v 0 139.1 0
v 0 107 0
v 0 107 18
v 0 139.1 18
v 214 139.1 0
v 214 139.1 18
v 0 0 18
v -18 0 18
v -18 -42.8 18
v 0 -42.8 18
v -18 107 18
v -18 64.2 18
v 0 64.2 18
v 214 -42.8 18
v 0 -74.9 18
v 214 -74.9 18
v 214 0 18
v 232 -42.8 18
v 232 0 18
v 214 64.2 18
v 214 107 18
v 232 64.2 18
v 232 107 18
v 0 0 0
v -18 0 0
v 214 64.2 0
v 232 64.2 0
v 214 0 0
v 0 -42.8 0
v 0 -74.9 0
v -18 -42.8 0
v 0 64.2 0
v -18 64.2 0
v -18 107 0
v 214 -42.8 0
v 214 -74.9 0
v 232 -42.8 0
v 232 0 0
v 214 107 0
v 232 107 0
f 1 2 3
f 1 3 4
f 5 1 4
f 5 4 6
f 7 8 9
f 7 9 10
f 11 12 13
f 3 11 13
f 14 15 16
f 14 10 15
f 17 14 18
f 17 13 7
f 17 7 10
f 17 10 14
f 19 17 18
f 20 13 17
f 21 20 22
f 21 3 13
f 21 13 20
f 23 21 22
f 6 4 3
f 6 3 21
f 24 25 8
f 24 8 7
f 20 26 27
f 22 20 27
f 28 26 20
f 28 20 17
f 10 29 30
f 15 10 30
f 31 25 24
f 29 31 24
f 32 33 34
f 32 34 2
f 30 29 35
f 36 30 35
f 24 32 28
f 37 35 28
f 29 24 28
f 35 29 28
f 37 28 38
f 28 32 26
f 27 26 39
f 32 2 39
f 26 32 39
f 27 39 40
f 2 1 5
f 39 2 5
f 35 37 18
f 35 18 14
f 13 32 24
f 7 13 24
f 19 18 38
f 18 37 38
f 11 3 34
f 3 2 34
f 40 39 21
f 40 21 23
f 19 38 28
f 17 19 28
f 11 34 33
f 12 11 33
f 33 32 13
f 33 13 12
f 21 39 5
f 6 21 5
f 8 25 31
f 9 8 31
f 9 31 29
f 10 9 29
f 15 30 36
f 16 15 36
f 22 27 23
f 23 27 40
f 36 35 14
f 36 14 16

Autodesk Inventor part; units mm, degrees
ref_plane "YZ Plane" through (0, 0, 0) normal (1, 0, 0) x (0, 1, 0)
ref_plane "XZ Plane" through (0, 0, 0) normal (0, 1, 0) x (-1, 0, 0)
ref_plane "XY Plane" through (0, 0, 0) normal (0, 0, 1) x (1, 0, 0)
sketch "Sketch1" plane through (0, 0, 0) normal (0, 0, 1) x (1, 0, 0)
  line L0 (232, 157.1) -> (-18, 157.1)
  line L1 (-18, 157.1) -> (-18, -92.9)
  line L2 (-18, -92.9) -> (232, -92.9)
  line L3 (232, -92.9) -> (232, 157.1)
  line L4 (-18, -42.8) -> (0, -42.8)
  line L5 (0, -42.8) -> (0, -92.9)
  line L6 (0, -92.9) -> (-18, -92.9)
  line L7 (-18, -92.9) -> (-18, -42.8)
  line L8 (0, 107) -> (0, 64.2)
  line L9 (0, 64.2) -> (-18, 64.2)
  line L10 (-18, 64.2) -> (-18, 107)
  line L11 (76.5522, 157.3937) -> (94.5522, 157.3937)
  line L12 (-18, -42.8) -> (-18, 0)
  line L13 (-18, 0) -> (0, 0)
  line L14 (0, 0) -> (0, -42.8)
  line L15 (0, -42.8) -> (-18, -42.8)
  line L16 (-18, -42.8) -> (0, -42.8)
  line L17 (0, -42.8) -> (0, 0)
  line L18 (0, 0) -> (-18, 0)
  line L19 (-18, 0) -> (-18, -42.8)
  line L20 (0, 0) -> (-18, 0)
  line L21 (-18, 0) -> (-18, 64.2)
  line L22 (-18, 64.2) -> (0, 64.2)
  line L23 (0, 64.2) -> (0, 0)
  line L24 (-18, 64.2) -> (-18, 107)
  line L25 (0, 64.2) -> (-18, 64.2)
  line L26 (-18, 64.2) -> (-18, 107)
  line L27 (76.5522, 157.3937) -> (94.5522, 157.3937)
  line L28 (0, 107) -> (0, 64.2)
  line L29 (76.5522, 157.3937) -> (94.5522, 157.3937)
  line L30 (0, 107) -> (0, 157.1)
  line L31 (0, 157.1) -> (-18, 157.1)
  line L32 (-18, 157.1) -> (-18, 107)
  line L33 (0, 64.2) -> (0, 107)
  line L34 (0, 107) -> (-18, 107)
  line L35 (232, -92.9) -> (94.5522, -92.9)
  line L36 (-18, -92.9) -> (107, -92.9)
  line L37 (107, -92.9) -> (107, 52.5886)
  line L38 (232, 157.1) -> (232, -92.9)
  line L39 (232, -42.8) -> (214, -42.8)
  line L40 (232, -92.9) -> (232, -42.8)
  line L41 (214, -42.8) -> (214, -92.9)
  line L42 (214, 107) -> (214, 64.2)
  line L43 (214, 107) -> (214, 64.2)
  line L44 (232, 64.2) -> (232, 107)
  line L45 (232, 64.2) -> (232, 107)
  line L46 (232, 64.2) -> (232, 107)
  line L47 (214, 107) -> (214, 157.1)
  line L48 (232, 157.1) -> (232, 107)
  line L49 (214, -42.8) -> (232, -42.8)
  line L50 (232, -42.8) -> (214, -42.8)
  line L51 (214, -42.8) -> (214, 0)
  line L52 (232, -42.8) -> (232, 0)
  line L53 (232, 0) -> (214, 0)
  line L54 (232, 0) -> (232, -42.8)
  line L55 (214, 0) -> (232, 0)
  line L56 (214, 0) -> (232, 0)
  line L57 (214, 64.2) -> (214, 0)
  line L58 (214, 64.2) -> (232, 64.2)
  line L59 (232, 0) -> (232, 64.2)
  line L60 (214, 64.2) -> (232, 64.2)
  line L61 (232, 64.2) -> (214, 64.2)
  line L62 (214, 0) -> (214, -42.8)
  line L63 (214, 64.2) -> (214, 107)
  line L64 (214, 107) -> (232, 107)
  line L65 (214, 157.1) -> (0, 157.1)
  line L66 (0, 157.1) -> (0, 139.1)
  line L67 (0, 139.1) -> (214, 139.1)
  line L68 (214, 139.1) -> (214, 157.1)
  line L69 (232, 157.1) -> (-18, 157.1)
  line L70 (-18, 157.1) -> (-18, 139.1)
  line L71 (-18, 139.1) -> (232, 139.1)
  line L72 (232, 139.1) -> (232, 157.1)
  line L73 (232, -92.9) -> (-18, -92.9)
  line L74 (-18, -92.9) -> (-18, -74.9)
  line L75 (-18, -74.9) -> (232, -74.9)
  line L76 (232, -74.9) -> (232, -92.9)
  point P0 (0, 0)
  point P1 (214, 0)
  point P2 (0, -74.9)
  point P3 (214, -74.9)
  dimension "d0" = 18
  dimension "d1" = 42.8
  dimension "d2" = 125
  dimension "d4" = 18
  dimension "d5" = 18
extrude "Plate1" add sketch "Sketch1" along normal blind 18 contours L47 L42 L57 L51 L41 L75 L5 L14 L23 L8 L30 L67 | L3 L58 L42 L64 | L8 L9 L1 L34 | L3 L39 L51 L53 | L14 L4 L1 L13
equation "\"d3\" = Thickness"
equation "\"BendRadius\" = Thickness"
equation "\"BendReliefWidth\" = Thickness"
equation "\"BendReliefDepth\" = 0.5 * Thickness"
equation "\"CornerReliefSize\" = 4 * Thickness"
equation "\"MinimumRemnant\" = 2 * Thickness"
equation "\"TransitionRadius\" = BendRadius"
equation "\"JacobiRadiusSize\" = BendRadius"
equation "\"GapSize\" = Thickness"
equation "\"Thickness\" = 18"
properties part number "7"
